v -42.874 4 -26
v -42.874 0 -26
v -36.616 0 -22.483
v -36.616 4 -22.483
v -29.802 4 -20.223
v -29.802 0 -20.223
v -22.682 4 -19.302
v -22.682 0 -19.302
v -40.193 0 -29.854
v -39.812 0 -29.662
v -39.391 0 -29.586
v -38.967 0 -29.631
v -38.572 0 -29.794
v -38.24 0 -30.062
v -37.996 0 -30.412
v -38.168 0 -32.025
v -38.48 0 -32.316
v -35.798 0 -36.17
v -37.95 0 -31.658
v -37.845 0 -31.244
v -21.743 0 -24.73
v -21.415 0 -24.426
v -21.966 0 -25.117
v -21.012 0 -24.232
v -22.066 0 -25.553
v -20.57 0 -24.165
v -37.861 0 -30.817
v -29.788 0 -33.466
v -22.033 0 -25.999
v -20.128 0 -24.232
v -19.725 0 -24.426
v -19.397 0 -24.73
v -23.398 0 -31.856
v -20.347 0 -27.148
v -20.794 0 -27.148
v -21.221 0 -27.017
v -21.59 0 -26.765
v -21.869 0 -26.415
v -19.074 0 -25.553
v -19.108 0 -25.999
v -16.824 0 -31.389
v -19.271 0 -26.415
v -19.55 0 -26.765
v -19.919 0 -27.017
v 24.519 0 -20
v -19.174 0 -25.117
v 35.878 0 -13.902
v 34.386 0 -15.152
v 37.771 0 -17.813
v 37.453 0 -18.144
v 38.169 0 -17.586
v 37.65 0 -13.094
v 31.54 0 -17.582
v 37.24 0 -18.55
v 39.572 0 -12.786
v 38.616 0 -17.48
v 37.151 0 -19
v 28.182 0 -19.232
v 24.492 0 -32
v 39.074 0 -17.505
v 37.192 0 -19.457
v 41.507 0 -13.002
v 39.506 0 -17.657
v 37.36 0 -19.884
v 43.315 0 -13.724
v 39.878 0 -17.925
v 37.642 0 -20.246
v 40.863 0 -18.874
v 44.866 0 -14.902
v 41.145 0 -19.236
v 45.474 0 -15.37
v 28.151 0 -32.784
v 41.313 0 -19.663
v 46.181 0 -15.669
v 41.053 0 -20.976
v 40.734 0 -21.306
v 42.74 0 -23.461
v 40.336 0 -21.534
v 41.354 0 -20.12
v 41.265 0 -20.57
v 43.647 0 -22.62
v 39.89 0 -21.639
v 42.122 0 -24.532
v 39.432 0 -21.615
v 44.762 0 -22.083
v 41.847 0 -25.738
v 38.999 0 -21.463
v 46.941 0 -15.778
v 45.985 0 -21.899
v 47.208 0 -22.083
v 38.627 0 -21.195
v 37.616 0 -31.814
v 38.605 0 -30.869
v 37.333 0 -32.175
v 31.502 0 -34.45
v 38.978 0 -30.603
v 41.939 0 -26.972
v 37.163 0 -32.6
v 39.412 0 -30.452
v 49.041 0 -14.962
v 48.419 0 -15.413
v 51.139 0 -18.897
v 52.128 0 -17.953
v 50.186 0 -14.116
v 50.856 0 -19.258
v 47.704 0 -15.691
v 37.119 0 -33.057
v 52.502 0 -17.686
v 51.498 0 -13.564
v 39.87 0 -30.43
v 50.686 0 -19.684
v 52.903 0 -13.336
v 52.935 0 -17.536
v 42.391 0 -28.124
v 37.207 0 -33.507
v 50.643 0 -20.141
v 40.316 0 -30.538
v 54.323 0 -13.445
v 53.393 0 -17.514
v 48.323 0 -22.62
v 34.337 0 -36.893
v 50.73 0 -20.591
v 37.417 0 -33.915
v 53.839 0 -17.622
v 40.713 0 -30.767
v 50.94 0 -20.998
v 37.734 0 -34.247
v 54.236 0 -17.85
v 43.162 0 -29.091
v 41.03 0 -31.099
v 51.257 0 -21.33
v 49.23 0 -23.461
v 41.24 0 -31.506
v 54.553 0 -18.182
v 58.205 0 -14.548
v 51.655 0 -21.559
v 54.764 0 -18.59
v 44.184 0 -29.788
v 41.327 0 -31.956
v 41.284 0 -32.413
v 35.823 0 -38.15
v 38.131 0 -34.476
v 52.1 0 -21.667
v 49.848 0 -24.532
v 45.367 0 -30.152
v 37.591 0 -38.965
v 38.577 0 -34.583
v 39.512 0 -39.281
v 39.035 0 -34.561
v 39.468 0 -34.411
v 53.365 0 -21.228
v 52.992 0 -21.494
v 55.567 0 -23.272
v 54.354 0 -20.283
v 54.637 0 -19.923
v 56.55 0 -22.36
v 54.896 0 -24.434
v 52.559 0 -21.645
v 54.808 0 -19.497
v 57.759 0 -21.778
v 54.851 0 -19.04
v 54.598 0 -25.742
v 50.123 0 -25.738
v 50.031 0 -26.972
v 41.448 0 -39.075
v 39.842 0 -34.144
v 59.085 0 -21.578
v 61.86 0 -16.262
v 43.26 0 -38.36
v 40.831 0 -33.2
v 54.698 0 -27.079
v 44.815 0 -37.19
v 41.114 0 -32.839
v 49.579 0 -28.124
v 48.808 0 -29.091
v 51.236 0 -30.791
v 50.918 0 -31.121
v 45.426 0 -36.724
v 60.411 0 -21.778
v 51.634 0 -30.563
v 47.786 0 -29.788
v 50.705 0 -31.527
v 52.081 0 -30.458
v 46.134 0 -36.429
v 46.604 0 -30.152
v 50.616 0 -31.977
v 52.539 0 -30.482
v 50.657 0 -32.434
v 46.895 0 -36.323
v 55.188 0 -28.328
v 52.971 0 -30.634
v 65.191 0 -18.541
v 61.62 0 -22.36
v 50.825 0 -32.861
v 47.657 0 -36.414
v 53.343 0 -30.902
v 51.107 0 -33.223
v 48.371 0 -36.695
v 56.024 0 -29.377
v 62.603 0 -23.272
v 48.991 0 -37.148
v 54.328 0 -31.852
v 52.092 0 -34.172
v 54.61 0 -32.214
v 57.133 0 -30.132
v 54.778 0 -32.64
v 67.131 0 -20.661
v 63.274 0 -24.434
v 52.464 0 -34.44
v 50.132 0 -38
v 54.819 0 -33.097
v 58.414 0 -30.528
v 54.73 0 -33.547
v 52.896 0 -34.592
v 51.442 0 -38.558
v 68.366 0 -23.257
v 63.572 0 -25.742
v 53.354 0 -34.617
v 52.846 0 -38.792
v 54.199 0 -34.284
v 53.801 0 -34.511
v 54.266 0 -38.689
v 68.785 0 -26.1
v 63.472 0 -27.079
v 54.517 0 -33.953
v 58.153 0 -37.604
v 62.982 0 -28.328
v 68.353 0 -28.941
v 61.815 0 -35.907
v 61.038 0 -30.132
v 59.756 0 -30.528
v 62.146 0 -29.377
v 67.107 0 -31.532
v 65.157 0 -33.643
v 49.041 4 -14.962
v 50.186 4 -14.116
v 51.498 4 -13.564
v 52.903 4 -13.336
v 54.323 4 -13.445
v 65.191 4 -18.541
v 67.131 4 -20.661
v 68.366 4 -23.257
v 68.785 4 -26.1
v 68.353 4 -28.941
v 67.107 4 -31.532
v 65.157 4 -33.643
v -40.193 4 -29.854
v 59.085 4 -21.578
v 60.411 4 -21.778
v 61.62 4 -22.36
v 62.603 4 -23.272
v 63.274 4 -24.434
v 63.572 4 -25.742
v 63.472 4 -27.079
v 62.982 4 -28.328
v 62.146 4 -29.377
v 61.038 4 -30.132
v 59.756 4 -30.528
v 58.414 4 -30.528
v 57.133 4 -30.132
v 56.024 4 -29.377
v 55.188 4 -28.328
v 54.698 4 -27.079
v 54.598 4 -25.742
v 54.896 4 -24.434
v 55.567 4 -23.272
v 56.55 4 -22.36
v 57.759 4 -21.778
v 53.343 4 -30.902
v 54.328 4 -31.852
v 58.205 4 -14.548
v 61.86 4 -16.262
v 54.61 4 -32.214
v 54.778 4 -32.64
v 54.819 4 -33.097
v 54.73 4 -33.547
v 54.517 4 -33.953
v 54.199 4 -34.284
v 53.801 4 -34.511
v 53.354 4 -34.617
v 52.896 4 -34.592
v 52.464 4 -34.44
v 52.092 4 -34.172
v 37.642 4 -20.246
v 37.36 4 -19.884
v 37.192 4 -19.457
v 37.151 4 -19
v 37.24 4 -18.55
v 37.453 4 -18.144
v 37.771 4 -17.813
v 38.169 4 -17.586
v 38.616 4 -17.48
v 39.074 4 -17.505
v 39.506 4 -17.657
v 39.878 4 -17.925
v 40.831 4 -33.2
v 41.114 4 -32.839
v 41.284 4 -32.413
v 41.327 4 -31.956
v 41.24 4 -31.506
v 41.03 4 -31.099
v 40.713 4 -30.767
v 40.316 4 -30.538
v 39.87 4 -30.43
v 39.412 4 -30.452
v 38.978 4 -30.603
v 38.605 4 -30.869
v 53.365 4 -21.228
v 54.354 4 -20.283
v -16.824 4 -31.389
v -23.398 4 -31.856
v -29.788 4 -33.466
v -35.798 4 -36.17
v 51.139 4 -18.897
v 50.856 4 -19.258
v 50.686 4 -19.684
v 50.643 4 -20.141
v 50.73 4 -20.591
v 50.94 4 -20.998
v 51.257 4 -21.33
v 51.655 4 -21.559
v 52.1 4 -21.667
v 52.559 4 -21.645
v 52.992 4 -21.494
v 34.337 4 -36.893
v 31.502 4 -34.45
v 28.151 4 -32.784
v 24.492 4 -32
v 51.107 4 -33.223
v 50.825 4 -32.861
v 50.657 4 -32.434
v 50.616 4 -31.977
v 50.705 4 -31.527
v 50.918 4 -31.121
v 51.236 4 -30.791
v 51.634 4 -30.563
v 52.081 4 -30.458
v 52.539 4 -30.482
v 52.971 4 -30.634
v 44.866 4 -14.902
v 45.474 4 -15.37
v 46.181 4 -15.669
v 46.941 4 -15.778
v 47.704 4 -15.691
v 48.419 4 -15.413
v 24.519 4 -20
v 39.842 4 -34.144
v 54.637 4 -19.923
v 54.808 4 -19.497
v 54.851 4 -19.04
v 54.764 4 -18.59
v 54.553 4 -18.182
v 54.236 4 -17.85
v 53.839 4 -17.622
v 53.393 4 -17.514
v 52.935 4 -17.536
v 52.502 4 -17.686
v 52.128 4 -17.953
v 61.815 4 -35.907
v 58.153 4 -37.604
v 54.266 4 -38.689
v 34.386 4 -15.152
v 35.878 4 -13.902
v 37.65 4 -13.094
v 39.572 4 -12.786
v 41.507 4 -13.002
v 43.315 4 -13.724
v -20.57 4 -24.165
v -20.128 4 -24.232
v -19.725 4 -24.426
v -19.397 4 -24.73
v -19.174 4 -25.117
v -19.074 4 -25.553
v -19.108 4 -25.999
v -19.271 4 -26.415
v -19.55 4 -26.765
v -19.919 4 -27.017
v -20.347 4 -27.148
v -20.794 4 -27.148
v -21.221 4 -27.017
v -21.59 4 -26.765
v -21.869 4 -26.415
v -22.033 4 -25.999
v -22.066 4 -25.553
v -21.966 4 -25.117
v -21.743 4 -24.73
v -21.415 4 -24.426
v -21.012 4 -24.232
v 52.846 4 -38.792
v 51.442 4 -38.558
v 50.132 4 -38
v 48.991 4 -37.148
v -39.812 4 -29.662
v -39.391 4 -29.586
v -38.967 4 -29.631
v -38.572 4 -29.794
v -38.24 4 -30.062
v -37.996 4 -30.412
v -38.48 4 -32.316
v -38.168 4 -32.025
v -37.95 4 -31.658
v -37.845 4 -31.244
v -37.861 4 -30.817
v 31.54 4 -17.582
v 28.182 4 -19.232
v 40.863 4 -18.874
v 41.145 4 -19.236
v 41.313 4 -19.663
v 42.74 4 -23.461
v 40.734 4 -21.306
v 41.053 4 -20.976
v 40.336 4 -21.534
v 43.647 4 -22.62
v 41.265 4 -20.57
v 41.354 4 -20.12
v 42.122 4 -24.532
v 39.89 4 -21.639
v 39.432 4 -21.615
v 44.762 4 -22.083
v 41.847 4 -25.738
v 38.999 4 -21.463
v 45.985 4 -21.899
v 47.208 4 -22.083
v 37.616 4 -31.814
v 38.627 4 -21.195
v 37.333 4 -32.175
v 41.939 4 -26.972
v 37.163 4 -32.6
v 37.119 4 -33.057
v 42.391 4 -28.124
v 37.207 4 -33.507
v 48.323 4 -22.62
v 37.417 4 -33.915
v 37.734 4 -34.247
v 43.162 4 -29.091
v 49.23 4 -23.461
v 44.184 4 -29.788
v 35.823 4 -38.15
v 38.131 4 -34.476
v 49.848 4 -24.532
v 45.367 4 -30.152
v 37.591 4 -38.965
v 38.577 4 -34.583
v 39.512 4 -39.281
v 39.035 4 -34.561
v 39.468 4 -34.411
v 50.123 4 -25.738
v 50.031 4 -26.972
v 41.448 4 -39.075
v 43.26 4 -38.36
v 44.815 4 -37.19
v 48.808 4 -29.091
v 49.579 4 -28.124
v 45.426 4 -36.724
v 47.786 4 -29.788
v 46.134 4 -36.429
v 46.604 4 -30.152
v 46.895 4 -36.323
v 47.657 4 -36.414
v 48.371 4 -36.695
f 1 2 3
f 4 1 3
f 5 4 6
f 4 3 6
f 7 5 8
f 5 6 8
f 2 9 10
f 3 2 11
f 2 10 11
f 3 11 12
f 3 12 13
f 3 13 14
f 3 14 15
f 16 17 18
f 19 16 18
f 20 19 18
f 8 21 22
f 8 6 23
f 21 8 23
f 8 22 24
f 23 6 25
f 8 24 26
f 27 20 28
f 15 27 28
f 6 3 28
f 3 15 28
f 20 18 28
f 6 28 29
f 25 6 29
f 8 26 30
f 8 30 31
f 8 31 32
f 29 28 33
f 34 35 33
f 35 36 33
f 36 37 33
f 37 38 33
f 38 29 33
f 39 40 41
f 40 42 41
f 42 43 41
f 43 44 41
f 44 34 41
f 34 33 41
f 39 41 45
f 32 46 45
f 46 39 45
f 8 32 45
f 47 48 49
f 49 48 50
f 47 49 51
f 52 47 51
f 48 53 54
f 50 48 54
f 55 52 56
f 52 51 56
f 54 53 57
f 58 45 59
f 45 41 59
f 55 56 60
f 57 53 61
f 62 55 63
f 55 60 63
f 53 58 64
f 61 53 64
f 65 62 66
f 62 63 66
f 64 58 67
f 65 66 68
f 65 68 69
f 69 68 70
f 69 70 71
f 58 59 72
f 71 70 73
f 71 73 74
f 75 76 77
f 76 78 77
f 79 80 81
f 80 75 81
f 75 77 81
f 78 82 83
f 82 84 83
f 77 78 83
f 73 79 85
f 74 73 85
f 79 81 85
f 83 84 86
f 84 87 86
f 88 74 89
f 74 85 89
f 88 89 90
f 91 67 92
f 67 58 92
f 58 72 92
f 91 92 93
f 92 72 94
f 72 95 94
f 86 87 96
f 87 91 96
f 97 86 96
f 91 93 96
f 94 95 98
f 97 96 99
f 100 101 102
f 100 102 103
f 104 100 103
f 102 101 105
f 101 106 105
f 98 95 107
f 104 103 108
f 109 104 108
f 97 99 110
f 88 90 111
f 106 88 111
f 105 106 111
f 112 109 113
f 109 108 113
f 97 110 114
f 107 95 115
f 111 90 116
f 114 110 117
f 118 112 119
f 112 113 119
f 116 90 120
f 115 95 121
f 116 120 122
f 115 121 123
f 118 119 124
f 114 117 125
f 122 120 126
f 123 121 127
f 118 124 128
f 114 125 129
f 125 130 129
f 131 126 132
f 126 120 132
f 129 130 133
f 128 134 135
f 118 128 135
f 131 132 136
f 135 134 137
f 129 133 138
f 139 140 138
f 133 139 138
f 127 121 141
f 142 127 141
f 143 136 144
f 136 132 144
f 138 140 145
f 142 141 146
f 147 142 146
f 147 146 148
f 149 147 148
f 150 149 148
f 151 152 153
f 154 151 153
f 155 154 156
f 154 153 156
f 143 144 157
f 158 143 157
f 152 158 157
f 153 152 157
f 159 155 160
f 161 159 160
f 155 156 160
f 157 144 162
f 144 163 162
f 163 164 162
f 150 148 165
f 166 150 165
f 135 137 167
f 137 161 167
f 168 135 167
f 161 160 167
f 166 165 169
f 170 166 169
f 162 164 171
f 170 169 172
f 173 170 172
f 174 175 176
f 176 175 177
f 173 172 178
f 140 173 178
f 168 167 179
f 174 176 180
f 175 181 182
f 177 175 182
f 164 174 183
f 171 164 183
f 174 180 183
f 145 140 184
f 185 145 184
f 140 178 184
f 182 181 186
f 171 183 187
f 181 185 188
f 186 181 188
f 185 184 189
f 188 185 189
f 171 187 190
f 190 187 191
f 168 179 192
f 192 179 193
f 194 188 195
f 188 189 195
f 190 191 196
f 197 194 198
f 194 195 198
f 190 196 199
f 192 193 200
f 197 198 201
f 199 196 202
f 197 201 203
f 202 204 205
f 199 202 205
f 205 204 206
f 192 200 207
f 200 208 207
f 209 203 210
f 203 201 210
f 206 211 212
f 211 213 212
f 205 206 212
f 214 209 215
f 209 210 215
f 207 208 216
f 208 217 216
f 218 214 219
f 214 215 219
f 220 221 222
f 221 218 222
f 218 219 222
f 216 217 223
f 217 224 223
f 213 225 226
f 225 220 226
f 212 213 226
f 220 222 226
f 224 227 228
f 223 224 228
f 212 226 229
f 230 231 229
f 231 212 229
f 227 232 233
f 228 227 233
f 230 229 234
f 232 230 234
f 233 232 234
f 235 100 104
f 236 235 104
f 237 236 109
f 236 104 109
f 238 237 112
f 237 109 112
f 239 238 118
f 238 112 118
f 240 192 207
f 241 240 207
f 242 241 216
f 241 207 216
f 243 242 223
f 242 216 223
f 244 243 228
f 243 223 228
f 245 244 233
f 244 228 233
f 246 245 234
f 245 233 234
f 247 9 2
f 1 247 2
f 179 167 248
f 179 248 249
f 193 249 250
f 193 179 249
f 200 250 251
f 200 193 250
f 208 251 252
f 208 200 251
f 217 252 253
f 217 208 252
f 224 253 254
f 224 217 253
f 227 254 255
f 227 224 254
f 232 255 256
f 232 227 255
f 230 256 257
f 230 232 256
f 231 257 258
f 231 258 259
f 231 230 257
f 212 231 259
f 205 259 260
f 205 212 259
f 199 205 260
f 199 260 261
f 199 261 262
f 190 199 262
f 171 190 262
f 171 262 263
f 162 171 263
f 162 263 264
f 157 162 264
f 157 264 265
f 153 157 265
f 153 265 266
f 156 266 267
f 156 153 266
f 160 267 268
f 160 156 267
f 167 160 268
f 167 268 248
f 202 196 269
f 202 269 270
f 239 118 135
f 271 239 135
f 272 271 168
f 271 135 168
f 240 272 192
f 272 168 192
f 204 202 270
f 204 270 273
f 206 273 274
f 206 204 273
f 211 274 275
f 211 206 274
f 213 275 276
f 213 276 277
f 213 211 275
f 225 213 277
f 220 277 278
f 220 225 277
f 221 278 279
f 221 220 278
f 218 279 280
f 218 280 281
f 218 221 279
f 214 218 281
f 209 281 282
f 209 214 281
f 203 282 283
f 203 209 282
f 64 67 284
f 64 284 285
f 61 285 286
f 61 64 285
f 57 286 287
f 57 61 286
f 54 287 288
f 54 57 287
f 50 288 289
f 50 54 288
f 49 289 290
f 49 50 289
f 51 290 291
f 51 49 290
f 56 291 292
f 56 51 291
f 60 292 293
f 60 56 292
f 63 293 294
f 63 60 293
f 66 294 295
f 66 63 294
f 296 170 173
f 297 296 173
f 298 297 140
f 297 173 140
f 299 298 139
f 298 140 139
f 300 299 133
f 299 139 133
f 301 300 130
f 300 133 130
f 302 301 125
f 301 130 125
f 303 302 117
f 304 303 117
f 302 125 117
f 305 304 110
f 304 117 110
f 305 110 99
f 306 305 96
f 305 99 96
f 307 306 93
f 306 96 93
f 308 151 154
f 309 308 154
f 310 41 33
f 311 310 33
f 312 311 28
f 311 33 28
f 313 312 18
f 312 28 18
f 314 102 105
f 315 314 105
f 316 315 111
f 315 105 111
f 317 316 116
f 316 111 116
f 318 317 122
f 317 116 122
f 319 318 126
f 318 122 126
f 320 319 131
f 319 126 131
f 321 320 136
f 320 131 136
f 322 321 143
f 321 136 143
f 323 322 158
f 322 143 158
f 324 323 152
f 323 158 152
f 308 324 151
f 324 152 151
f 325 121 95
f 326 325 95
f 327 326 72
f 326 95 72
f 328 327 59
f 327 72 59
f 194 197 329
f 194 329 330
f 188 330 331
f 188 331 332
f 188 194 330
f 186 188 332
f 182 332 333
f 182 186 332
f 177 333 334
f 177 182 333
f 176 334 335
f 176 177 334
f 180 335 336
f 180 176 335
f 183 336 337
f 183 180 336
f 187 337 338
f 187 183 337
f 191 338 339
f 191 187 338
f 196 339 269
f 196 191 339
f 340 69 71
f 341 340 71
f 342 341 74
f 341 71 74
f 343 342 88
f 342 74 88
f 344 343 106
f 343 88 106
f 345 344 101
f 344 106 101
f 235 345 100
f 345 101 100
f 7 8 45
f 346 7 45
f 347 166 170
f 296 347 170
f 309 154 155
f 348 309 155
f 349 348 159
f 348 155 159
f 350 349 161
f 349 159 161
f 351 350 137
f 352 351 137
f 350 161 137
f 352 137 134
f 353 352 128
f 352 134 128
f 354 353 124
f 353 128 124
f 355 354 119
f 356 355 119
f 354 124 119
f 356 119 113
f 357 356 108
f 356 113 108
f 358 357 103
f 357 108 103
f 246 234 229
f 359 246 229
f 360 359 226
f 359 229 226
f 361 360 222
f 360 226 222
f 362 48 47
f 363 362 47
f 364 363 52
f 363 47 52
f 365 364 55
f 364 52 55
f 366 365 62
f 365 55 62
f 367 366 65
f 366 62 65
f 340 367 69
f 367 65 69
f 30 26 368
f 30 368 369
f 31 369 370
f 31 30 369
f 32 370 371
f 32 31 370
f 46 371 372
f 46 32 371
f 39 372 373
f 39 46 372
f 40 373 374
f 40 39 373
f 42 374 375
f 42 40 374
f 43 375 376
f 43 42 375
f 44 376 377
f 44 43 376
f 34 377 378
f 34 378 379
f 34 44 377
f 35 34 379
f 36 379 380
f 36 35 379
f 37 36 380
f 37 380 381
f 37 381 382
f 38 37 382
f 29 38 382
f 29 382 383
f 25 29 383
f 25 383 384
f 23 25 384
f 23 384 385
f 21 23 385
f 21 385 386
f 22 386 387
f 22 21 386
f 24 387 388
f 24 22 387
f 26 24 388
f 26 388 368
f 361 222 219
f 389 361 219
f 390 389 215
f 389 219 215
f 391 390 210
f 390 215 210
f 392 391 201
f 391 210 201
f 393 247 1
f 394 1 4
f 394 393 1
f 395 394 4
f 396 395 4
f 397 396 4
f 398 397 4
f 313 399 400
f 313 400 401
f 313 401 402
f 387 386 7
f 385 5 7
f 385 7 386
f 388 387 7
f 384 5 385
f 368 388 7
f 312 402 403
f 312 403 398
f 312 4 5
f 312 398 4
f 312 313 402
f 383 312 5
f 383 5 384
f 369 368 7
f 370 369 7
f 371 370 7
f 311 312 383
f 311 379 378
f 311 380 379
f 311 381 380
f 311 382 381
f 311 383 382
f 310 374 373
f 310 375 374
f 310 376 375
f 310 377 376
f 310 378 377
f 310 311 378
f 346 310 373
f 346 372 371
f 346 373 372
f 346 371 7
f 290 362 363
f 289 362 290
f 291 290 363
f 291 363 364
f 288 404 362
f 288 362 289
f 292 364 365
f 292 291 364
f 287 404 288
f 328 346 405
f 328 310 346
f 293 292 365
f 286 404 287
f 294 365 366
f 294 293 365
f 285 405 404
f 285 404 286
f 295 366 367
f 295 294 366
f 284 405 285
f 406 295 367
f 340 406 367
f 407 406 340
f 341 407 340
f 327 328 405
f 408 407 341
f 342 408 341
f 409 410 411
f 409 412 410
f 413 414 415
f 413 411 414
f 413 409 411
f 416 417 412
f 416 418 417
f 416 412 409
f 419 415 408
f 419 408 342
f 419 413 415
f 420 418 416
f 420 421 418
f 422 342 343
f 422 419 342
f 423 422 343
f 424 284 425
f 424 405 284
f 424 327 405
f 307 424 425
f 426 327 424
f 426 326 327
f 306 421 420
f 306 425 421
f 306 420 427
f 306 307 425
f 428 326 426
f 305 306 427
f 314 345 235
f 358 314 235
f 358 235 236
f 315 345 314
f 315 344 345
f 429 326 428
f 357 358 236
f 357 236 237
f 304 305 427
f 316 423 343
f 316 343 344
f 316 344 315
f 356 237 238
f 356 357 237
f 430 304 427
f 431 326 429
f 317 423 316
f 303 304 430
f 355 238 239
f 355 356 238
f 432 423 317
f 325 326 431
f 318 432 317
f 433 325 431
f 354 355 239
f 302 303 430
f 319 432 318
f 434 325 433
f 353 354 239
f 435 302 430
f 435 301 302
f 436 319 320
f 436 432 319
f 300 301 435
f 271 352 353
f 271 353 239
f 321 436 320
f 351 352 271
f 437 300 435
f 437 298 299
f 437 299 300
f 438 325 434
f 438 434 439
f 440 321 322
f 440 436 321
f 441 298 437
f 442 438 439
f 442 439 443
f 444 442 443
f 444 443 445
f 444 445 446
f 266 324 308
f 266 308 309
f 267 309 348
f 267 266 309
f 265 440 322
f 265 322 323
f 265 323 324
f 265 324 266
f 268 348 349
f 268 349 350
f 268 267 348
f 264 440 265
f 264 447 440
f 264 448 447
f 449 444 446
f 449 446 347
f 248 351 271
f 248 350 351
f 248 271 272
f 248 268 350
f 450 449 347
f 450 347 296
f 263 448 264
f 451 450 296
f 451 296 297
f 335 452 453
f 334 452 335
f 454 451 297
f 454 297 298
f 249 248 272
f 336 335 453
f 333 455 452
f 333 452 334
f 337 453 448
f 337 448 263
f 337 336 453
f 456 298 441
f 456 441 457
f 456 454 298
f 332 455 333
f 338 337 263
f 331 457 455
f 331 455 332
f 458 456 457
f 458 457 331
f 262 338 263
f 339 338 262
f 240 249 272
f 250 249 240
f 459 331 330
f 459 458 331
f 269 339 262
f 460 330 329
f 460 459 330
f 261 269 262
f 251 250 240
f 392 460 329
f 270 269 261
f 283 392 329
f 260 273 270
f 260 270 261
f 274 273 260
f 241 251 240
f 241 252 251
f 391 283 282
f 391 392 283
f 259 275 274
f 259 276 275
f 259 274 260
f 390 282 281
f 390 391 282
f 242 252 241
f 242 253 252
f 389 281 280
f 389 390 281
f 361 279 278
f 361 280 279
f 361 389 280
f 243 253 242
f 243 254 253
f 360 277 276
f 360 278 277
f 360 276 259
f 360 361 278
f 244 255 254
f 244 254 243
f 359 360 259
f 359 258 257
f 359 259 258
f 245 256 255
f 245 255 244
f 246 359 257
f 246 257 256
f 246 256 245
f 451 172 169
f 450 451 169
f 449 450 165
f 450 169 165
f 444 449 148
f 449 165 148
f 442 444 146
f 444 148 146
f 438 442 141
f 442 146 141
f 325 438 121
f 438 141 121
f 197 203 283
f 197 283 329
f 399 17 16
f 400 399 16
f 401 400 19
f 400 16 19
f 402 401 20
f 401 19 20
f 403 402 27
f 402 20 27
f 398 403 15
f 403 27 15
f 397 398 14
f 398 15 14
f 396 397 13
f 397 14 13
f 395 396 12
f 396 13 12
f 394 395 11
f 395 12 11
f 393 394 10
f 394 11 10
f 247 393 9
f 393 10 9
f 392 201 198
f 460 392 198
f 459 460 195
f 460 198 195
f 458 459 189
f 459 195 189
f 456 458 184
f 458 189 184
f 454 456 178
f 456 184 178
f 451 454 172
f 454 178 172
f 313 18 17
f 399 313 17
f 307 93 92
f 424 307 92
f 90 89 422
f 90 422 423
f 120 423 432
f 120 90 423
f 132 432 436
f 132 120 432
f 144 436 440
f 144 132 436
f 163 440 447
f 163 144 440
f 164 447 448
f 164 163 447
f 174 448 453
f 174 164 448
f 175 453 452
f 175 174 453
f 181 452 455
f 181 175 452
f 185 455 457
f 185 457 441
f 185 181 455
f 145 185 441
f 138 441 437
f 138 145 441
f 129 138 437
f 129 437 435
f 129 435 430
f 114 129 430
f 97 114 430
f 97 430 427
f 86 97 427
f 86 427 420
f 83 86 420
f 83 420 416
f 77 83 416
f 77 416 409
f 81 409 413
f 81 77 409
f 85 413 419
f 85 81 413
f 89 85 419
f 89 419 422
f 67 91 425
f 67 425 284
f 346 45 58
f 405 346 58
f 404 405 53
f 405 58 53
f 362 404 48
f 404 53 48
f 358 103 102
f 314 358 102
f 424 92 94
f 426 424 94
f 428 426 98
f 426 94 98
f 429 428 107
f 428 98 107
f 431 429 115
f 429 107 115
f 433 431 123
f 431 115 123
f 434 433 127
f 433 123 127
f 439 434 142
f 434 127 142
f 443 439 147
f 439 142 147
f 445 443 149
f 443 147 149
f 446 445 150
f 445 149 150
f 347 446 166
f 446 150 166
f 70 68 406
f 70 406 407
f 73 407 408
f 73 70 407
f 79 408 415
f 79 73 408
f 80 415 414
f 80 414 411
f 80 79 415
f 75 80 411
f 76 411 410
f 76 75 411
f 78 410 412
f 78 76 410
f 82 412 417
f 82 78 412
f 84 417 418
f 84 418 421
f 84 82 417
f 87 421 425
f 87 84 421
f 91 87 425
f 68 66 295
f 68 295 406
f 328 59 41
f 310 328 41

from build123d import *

# Parameters (mm, degrees)
SKETCH1_R           = 4.5
SKETCH1_R_2         = 4.15
SKETCH1_R_3         = 1.5
BOSS_EXTRUDE2_DEPTH = 4


with BuildPart() as part:
    # Sketch1 → Boss-Extrude2 (new body)
    with BuildSketch(Plane(origin=(0, 0, 0), x_dir=(1, 0, 0), z_dir=(0, 1, 0))):
        with BuildLine():
            Line((24.492030041, 32), (-16.82364897, 31.38929644))
            ThreePointArc((-16.82364897, 31.38929644), (-26.628373919, 32.520273369), (-35.798432863, 36.170171872))
            Line((-35.798432863, 36.170171872), (-38.479754021, 32.316380416))
            ThreePointArc((-38.479754021, 32.316380416), (-38.105147294, 30.228398184), (-40.193129525, 29.853791457))
            Line((-40.193129525, 29.853791457), (-42.874450683, 26))
            ThreePointArc((-42.874450683, 26), (-33.263093393, 21.189213431), (-22.681899906, 19.302363998))
            Line((-22.681899906, 19.302363998), (24.519122197, 20.000061166))
            ThreePointArc((24.519122197, 20.000061166), (29.912542793, 18.512398384), (34.38564897, 15.151825901))
            ThreePointArc((34.38564897, 15.151825901), (39.572200335, 12.78648108), (44.865586737, 14.901955396))
            ThreePointArc((44.865586737, 14.901955396), (46.941127439, 15.77786367), (49.041095181, 14.962253472))
            ThreePointArc((49.041095181, 14.962253472), (51.498094019, 13.563547988), (54.322847672, 13.445280812))
            ThreePointArc((54.322847672, 13.445280812), (60.067220976, 15.331144894), (65.190877045, 18.540888881))
            ThreePointArc((65.190877045, 18.540888881), (68.785066518, 26.1), (65.156781581, 33.642805002))
            ThreePointArc((65.156781581, 33.642805002), (60.018684596, 36.829381119), (54.265854499, 38.689288065))
            ThreePointArc((54.265854499, 38.689288065), (51.441663661, 38.558267317), (48.991005527, 37.148481859))
            ThreePointArc((48.991005527, 37.148481859), (46.894741967, 36.323397867), (44.815267383, 37.189925399))
            ThreePointArc((44.815267383, 37.189925399), (39.512382816, 39.281476607), (34.336564706, 36.892736755))
            ThreePointArc((34.336564706, 36.892736755), (29.878678322, 33.512000849), (24.492030041, 32))
        make_face()
        with Locations(Location((59.085066518, 26.078100395, 0), (0, 0, 270))):
            Circle(SKETCH1_R, mode=Mode.SUBTRACT)
        with Locations(Location((45.985066518, 26.04852464, 0), (0, 0, 270))):
            Circle(SKETCH1_R_2, mode=Mode.SUBTRACT)
        with Locations(Location((-20.570161775, 25.66516132, 0), (0, 0, 270))):
            Circle(SKETCH1_R_3, mode=Mode.SUBTRACT)
        with BuildLine():
            Line((39.841844345, 34.144341712), (40.83090249, 33.199674393))
            ThreePointArc((40.83090249, 33.199674393), (40.883202658, 30.92140707), (38.604935336, 30.869106902))
            Line((38.604935336, 30.869106902), (37.615877191, 31.813774221))
            ThreePointArc((37.615877191, 31.813774221), (37.563577023, 34.092041544), (39.841844345, 34.144341712))
        make_face(mode=Mode.SUBTRACT)
        with BuildLine():
            Line((52.091670541, 34.171998037), (51.106887992, 33.222874395))
            ThreePointArc((51.106887992, 33.222874395), (51.064875553, 30.944394144), (53.343355804, 30.902381704))
            Line((53.343355804, 30.902381704), (54.328138354, 31.851505346))
            ThreePointArc((54.328138354, 31.851505346), (54.370150793, 34.129985598), (52.091670541, 34.171998037))
        make_face(mode=Mode.SUBTRACT)
        with BuildLine():
            Line((52.128288691, 17.952707568), (51.139230546, 18.897374887))
            ThreePointArc((51.139230546, 18.897374887), (51.086930378, 21.17564221), (53.365197701, 21.227942378))
            Line((53.365197701, 21.227942378), (54.354255846, 20.283275059))
            ThreePointArc((54.354255846, 20.283275059), (54.406556014, 18.005007736), (52.128288691, 17.952707568))
        make_face(mode=Mode.SUBTRACT)
        with BuildLine():
            Line((39.878462495, 17.925051243), (40.863245045, 18.874174885))
            ThreePointArc((40.863245045, 18.874174885), (40.905257484, 21.152655136), (38.626777232, 21.194667576))
            Line((38.626777232, 21.194667576), (37.641994683, 20.245543933))
            ThreePointArc((37.641994683, 20.245543933), (37.599982244, 17.967063682), (39.878462495, 17.925051243))
        make_face(mode=Mode.SUBTRACT)
    extrude(amount=BOSS_EXTRUDE2_DEPTH)


solid = part.part
